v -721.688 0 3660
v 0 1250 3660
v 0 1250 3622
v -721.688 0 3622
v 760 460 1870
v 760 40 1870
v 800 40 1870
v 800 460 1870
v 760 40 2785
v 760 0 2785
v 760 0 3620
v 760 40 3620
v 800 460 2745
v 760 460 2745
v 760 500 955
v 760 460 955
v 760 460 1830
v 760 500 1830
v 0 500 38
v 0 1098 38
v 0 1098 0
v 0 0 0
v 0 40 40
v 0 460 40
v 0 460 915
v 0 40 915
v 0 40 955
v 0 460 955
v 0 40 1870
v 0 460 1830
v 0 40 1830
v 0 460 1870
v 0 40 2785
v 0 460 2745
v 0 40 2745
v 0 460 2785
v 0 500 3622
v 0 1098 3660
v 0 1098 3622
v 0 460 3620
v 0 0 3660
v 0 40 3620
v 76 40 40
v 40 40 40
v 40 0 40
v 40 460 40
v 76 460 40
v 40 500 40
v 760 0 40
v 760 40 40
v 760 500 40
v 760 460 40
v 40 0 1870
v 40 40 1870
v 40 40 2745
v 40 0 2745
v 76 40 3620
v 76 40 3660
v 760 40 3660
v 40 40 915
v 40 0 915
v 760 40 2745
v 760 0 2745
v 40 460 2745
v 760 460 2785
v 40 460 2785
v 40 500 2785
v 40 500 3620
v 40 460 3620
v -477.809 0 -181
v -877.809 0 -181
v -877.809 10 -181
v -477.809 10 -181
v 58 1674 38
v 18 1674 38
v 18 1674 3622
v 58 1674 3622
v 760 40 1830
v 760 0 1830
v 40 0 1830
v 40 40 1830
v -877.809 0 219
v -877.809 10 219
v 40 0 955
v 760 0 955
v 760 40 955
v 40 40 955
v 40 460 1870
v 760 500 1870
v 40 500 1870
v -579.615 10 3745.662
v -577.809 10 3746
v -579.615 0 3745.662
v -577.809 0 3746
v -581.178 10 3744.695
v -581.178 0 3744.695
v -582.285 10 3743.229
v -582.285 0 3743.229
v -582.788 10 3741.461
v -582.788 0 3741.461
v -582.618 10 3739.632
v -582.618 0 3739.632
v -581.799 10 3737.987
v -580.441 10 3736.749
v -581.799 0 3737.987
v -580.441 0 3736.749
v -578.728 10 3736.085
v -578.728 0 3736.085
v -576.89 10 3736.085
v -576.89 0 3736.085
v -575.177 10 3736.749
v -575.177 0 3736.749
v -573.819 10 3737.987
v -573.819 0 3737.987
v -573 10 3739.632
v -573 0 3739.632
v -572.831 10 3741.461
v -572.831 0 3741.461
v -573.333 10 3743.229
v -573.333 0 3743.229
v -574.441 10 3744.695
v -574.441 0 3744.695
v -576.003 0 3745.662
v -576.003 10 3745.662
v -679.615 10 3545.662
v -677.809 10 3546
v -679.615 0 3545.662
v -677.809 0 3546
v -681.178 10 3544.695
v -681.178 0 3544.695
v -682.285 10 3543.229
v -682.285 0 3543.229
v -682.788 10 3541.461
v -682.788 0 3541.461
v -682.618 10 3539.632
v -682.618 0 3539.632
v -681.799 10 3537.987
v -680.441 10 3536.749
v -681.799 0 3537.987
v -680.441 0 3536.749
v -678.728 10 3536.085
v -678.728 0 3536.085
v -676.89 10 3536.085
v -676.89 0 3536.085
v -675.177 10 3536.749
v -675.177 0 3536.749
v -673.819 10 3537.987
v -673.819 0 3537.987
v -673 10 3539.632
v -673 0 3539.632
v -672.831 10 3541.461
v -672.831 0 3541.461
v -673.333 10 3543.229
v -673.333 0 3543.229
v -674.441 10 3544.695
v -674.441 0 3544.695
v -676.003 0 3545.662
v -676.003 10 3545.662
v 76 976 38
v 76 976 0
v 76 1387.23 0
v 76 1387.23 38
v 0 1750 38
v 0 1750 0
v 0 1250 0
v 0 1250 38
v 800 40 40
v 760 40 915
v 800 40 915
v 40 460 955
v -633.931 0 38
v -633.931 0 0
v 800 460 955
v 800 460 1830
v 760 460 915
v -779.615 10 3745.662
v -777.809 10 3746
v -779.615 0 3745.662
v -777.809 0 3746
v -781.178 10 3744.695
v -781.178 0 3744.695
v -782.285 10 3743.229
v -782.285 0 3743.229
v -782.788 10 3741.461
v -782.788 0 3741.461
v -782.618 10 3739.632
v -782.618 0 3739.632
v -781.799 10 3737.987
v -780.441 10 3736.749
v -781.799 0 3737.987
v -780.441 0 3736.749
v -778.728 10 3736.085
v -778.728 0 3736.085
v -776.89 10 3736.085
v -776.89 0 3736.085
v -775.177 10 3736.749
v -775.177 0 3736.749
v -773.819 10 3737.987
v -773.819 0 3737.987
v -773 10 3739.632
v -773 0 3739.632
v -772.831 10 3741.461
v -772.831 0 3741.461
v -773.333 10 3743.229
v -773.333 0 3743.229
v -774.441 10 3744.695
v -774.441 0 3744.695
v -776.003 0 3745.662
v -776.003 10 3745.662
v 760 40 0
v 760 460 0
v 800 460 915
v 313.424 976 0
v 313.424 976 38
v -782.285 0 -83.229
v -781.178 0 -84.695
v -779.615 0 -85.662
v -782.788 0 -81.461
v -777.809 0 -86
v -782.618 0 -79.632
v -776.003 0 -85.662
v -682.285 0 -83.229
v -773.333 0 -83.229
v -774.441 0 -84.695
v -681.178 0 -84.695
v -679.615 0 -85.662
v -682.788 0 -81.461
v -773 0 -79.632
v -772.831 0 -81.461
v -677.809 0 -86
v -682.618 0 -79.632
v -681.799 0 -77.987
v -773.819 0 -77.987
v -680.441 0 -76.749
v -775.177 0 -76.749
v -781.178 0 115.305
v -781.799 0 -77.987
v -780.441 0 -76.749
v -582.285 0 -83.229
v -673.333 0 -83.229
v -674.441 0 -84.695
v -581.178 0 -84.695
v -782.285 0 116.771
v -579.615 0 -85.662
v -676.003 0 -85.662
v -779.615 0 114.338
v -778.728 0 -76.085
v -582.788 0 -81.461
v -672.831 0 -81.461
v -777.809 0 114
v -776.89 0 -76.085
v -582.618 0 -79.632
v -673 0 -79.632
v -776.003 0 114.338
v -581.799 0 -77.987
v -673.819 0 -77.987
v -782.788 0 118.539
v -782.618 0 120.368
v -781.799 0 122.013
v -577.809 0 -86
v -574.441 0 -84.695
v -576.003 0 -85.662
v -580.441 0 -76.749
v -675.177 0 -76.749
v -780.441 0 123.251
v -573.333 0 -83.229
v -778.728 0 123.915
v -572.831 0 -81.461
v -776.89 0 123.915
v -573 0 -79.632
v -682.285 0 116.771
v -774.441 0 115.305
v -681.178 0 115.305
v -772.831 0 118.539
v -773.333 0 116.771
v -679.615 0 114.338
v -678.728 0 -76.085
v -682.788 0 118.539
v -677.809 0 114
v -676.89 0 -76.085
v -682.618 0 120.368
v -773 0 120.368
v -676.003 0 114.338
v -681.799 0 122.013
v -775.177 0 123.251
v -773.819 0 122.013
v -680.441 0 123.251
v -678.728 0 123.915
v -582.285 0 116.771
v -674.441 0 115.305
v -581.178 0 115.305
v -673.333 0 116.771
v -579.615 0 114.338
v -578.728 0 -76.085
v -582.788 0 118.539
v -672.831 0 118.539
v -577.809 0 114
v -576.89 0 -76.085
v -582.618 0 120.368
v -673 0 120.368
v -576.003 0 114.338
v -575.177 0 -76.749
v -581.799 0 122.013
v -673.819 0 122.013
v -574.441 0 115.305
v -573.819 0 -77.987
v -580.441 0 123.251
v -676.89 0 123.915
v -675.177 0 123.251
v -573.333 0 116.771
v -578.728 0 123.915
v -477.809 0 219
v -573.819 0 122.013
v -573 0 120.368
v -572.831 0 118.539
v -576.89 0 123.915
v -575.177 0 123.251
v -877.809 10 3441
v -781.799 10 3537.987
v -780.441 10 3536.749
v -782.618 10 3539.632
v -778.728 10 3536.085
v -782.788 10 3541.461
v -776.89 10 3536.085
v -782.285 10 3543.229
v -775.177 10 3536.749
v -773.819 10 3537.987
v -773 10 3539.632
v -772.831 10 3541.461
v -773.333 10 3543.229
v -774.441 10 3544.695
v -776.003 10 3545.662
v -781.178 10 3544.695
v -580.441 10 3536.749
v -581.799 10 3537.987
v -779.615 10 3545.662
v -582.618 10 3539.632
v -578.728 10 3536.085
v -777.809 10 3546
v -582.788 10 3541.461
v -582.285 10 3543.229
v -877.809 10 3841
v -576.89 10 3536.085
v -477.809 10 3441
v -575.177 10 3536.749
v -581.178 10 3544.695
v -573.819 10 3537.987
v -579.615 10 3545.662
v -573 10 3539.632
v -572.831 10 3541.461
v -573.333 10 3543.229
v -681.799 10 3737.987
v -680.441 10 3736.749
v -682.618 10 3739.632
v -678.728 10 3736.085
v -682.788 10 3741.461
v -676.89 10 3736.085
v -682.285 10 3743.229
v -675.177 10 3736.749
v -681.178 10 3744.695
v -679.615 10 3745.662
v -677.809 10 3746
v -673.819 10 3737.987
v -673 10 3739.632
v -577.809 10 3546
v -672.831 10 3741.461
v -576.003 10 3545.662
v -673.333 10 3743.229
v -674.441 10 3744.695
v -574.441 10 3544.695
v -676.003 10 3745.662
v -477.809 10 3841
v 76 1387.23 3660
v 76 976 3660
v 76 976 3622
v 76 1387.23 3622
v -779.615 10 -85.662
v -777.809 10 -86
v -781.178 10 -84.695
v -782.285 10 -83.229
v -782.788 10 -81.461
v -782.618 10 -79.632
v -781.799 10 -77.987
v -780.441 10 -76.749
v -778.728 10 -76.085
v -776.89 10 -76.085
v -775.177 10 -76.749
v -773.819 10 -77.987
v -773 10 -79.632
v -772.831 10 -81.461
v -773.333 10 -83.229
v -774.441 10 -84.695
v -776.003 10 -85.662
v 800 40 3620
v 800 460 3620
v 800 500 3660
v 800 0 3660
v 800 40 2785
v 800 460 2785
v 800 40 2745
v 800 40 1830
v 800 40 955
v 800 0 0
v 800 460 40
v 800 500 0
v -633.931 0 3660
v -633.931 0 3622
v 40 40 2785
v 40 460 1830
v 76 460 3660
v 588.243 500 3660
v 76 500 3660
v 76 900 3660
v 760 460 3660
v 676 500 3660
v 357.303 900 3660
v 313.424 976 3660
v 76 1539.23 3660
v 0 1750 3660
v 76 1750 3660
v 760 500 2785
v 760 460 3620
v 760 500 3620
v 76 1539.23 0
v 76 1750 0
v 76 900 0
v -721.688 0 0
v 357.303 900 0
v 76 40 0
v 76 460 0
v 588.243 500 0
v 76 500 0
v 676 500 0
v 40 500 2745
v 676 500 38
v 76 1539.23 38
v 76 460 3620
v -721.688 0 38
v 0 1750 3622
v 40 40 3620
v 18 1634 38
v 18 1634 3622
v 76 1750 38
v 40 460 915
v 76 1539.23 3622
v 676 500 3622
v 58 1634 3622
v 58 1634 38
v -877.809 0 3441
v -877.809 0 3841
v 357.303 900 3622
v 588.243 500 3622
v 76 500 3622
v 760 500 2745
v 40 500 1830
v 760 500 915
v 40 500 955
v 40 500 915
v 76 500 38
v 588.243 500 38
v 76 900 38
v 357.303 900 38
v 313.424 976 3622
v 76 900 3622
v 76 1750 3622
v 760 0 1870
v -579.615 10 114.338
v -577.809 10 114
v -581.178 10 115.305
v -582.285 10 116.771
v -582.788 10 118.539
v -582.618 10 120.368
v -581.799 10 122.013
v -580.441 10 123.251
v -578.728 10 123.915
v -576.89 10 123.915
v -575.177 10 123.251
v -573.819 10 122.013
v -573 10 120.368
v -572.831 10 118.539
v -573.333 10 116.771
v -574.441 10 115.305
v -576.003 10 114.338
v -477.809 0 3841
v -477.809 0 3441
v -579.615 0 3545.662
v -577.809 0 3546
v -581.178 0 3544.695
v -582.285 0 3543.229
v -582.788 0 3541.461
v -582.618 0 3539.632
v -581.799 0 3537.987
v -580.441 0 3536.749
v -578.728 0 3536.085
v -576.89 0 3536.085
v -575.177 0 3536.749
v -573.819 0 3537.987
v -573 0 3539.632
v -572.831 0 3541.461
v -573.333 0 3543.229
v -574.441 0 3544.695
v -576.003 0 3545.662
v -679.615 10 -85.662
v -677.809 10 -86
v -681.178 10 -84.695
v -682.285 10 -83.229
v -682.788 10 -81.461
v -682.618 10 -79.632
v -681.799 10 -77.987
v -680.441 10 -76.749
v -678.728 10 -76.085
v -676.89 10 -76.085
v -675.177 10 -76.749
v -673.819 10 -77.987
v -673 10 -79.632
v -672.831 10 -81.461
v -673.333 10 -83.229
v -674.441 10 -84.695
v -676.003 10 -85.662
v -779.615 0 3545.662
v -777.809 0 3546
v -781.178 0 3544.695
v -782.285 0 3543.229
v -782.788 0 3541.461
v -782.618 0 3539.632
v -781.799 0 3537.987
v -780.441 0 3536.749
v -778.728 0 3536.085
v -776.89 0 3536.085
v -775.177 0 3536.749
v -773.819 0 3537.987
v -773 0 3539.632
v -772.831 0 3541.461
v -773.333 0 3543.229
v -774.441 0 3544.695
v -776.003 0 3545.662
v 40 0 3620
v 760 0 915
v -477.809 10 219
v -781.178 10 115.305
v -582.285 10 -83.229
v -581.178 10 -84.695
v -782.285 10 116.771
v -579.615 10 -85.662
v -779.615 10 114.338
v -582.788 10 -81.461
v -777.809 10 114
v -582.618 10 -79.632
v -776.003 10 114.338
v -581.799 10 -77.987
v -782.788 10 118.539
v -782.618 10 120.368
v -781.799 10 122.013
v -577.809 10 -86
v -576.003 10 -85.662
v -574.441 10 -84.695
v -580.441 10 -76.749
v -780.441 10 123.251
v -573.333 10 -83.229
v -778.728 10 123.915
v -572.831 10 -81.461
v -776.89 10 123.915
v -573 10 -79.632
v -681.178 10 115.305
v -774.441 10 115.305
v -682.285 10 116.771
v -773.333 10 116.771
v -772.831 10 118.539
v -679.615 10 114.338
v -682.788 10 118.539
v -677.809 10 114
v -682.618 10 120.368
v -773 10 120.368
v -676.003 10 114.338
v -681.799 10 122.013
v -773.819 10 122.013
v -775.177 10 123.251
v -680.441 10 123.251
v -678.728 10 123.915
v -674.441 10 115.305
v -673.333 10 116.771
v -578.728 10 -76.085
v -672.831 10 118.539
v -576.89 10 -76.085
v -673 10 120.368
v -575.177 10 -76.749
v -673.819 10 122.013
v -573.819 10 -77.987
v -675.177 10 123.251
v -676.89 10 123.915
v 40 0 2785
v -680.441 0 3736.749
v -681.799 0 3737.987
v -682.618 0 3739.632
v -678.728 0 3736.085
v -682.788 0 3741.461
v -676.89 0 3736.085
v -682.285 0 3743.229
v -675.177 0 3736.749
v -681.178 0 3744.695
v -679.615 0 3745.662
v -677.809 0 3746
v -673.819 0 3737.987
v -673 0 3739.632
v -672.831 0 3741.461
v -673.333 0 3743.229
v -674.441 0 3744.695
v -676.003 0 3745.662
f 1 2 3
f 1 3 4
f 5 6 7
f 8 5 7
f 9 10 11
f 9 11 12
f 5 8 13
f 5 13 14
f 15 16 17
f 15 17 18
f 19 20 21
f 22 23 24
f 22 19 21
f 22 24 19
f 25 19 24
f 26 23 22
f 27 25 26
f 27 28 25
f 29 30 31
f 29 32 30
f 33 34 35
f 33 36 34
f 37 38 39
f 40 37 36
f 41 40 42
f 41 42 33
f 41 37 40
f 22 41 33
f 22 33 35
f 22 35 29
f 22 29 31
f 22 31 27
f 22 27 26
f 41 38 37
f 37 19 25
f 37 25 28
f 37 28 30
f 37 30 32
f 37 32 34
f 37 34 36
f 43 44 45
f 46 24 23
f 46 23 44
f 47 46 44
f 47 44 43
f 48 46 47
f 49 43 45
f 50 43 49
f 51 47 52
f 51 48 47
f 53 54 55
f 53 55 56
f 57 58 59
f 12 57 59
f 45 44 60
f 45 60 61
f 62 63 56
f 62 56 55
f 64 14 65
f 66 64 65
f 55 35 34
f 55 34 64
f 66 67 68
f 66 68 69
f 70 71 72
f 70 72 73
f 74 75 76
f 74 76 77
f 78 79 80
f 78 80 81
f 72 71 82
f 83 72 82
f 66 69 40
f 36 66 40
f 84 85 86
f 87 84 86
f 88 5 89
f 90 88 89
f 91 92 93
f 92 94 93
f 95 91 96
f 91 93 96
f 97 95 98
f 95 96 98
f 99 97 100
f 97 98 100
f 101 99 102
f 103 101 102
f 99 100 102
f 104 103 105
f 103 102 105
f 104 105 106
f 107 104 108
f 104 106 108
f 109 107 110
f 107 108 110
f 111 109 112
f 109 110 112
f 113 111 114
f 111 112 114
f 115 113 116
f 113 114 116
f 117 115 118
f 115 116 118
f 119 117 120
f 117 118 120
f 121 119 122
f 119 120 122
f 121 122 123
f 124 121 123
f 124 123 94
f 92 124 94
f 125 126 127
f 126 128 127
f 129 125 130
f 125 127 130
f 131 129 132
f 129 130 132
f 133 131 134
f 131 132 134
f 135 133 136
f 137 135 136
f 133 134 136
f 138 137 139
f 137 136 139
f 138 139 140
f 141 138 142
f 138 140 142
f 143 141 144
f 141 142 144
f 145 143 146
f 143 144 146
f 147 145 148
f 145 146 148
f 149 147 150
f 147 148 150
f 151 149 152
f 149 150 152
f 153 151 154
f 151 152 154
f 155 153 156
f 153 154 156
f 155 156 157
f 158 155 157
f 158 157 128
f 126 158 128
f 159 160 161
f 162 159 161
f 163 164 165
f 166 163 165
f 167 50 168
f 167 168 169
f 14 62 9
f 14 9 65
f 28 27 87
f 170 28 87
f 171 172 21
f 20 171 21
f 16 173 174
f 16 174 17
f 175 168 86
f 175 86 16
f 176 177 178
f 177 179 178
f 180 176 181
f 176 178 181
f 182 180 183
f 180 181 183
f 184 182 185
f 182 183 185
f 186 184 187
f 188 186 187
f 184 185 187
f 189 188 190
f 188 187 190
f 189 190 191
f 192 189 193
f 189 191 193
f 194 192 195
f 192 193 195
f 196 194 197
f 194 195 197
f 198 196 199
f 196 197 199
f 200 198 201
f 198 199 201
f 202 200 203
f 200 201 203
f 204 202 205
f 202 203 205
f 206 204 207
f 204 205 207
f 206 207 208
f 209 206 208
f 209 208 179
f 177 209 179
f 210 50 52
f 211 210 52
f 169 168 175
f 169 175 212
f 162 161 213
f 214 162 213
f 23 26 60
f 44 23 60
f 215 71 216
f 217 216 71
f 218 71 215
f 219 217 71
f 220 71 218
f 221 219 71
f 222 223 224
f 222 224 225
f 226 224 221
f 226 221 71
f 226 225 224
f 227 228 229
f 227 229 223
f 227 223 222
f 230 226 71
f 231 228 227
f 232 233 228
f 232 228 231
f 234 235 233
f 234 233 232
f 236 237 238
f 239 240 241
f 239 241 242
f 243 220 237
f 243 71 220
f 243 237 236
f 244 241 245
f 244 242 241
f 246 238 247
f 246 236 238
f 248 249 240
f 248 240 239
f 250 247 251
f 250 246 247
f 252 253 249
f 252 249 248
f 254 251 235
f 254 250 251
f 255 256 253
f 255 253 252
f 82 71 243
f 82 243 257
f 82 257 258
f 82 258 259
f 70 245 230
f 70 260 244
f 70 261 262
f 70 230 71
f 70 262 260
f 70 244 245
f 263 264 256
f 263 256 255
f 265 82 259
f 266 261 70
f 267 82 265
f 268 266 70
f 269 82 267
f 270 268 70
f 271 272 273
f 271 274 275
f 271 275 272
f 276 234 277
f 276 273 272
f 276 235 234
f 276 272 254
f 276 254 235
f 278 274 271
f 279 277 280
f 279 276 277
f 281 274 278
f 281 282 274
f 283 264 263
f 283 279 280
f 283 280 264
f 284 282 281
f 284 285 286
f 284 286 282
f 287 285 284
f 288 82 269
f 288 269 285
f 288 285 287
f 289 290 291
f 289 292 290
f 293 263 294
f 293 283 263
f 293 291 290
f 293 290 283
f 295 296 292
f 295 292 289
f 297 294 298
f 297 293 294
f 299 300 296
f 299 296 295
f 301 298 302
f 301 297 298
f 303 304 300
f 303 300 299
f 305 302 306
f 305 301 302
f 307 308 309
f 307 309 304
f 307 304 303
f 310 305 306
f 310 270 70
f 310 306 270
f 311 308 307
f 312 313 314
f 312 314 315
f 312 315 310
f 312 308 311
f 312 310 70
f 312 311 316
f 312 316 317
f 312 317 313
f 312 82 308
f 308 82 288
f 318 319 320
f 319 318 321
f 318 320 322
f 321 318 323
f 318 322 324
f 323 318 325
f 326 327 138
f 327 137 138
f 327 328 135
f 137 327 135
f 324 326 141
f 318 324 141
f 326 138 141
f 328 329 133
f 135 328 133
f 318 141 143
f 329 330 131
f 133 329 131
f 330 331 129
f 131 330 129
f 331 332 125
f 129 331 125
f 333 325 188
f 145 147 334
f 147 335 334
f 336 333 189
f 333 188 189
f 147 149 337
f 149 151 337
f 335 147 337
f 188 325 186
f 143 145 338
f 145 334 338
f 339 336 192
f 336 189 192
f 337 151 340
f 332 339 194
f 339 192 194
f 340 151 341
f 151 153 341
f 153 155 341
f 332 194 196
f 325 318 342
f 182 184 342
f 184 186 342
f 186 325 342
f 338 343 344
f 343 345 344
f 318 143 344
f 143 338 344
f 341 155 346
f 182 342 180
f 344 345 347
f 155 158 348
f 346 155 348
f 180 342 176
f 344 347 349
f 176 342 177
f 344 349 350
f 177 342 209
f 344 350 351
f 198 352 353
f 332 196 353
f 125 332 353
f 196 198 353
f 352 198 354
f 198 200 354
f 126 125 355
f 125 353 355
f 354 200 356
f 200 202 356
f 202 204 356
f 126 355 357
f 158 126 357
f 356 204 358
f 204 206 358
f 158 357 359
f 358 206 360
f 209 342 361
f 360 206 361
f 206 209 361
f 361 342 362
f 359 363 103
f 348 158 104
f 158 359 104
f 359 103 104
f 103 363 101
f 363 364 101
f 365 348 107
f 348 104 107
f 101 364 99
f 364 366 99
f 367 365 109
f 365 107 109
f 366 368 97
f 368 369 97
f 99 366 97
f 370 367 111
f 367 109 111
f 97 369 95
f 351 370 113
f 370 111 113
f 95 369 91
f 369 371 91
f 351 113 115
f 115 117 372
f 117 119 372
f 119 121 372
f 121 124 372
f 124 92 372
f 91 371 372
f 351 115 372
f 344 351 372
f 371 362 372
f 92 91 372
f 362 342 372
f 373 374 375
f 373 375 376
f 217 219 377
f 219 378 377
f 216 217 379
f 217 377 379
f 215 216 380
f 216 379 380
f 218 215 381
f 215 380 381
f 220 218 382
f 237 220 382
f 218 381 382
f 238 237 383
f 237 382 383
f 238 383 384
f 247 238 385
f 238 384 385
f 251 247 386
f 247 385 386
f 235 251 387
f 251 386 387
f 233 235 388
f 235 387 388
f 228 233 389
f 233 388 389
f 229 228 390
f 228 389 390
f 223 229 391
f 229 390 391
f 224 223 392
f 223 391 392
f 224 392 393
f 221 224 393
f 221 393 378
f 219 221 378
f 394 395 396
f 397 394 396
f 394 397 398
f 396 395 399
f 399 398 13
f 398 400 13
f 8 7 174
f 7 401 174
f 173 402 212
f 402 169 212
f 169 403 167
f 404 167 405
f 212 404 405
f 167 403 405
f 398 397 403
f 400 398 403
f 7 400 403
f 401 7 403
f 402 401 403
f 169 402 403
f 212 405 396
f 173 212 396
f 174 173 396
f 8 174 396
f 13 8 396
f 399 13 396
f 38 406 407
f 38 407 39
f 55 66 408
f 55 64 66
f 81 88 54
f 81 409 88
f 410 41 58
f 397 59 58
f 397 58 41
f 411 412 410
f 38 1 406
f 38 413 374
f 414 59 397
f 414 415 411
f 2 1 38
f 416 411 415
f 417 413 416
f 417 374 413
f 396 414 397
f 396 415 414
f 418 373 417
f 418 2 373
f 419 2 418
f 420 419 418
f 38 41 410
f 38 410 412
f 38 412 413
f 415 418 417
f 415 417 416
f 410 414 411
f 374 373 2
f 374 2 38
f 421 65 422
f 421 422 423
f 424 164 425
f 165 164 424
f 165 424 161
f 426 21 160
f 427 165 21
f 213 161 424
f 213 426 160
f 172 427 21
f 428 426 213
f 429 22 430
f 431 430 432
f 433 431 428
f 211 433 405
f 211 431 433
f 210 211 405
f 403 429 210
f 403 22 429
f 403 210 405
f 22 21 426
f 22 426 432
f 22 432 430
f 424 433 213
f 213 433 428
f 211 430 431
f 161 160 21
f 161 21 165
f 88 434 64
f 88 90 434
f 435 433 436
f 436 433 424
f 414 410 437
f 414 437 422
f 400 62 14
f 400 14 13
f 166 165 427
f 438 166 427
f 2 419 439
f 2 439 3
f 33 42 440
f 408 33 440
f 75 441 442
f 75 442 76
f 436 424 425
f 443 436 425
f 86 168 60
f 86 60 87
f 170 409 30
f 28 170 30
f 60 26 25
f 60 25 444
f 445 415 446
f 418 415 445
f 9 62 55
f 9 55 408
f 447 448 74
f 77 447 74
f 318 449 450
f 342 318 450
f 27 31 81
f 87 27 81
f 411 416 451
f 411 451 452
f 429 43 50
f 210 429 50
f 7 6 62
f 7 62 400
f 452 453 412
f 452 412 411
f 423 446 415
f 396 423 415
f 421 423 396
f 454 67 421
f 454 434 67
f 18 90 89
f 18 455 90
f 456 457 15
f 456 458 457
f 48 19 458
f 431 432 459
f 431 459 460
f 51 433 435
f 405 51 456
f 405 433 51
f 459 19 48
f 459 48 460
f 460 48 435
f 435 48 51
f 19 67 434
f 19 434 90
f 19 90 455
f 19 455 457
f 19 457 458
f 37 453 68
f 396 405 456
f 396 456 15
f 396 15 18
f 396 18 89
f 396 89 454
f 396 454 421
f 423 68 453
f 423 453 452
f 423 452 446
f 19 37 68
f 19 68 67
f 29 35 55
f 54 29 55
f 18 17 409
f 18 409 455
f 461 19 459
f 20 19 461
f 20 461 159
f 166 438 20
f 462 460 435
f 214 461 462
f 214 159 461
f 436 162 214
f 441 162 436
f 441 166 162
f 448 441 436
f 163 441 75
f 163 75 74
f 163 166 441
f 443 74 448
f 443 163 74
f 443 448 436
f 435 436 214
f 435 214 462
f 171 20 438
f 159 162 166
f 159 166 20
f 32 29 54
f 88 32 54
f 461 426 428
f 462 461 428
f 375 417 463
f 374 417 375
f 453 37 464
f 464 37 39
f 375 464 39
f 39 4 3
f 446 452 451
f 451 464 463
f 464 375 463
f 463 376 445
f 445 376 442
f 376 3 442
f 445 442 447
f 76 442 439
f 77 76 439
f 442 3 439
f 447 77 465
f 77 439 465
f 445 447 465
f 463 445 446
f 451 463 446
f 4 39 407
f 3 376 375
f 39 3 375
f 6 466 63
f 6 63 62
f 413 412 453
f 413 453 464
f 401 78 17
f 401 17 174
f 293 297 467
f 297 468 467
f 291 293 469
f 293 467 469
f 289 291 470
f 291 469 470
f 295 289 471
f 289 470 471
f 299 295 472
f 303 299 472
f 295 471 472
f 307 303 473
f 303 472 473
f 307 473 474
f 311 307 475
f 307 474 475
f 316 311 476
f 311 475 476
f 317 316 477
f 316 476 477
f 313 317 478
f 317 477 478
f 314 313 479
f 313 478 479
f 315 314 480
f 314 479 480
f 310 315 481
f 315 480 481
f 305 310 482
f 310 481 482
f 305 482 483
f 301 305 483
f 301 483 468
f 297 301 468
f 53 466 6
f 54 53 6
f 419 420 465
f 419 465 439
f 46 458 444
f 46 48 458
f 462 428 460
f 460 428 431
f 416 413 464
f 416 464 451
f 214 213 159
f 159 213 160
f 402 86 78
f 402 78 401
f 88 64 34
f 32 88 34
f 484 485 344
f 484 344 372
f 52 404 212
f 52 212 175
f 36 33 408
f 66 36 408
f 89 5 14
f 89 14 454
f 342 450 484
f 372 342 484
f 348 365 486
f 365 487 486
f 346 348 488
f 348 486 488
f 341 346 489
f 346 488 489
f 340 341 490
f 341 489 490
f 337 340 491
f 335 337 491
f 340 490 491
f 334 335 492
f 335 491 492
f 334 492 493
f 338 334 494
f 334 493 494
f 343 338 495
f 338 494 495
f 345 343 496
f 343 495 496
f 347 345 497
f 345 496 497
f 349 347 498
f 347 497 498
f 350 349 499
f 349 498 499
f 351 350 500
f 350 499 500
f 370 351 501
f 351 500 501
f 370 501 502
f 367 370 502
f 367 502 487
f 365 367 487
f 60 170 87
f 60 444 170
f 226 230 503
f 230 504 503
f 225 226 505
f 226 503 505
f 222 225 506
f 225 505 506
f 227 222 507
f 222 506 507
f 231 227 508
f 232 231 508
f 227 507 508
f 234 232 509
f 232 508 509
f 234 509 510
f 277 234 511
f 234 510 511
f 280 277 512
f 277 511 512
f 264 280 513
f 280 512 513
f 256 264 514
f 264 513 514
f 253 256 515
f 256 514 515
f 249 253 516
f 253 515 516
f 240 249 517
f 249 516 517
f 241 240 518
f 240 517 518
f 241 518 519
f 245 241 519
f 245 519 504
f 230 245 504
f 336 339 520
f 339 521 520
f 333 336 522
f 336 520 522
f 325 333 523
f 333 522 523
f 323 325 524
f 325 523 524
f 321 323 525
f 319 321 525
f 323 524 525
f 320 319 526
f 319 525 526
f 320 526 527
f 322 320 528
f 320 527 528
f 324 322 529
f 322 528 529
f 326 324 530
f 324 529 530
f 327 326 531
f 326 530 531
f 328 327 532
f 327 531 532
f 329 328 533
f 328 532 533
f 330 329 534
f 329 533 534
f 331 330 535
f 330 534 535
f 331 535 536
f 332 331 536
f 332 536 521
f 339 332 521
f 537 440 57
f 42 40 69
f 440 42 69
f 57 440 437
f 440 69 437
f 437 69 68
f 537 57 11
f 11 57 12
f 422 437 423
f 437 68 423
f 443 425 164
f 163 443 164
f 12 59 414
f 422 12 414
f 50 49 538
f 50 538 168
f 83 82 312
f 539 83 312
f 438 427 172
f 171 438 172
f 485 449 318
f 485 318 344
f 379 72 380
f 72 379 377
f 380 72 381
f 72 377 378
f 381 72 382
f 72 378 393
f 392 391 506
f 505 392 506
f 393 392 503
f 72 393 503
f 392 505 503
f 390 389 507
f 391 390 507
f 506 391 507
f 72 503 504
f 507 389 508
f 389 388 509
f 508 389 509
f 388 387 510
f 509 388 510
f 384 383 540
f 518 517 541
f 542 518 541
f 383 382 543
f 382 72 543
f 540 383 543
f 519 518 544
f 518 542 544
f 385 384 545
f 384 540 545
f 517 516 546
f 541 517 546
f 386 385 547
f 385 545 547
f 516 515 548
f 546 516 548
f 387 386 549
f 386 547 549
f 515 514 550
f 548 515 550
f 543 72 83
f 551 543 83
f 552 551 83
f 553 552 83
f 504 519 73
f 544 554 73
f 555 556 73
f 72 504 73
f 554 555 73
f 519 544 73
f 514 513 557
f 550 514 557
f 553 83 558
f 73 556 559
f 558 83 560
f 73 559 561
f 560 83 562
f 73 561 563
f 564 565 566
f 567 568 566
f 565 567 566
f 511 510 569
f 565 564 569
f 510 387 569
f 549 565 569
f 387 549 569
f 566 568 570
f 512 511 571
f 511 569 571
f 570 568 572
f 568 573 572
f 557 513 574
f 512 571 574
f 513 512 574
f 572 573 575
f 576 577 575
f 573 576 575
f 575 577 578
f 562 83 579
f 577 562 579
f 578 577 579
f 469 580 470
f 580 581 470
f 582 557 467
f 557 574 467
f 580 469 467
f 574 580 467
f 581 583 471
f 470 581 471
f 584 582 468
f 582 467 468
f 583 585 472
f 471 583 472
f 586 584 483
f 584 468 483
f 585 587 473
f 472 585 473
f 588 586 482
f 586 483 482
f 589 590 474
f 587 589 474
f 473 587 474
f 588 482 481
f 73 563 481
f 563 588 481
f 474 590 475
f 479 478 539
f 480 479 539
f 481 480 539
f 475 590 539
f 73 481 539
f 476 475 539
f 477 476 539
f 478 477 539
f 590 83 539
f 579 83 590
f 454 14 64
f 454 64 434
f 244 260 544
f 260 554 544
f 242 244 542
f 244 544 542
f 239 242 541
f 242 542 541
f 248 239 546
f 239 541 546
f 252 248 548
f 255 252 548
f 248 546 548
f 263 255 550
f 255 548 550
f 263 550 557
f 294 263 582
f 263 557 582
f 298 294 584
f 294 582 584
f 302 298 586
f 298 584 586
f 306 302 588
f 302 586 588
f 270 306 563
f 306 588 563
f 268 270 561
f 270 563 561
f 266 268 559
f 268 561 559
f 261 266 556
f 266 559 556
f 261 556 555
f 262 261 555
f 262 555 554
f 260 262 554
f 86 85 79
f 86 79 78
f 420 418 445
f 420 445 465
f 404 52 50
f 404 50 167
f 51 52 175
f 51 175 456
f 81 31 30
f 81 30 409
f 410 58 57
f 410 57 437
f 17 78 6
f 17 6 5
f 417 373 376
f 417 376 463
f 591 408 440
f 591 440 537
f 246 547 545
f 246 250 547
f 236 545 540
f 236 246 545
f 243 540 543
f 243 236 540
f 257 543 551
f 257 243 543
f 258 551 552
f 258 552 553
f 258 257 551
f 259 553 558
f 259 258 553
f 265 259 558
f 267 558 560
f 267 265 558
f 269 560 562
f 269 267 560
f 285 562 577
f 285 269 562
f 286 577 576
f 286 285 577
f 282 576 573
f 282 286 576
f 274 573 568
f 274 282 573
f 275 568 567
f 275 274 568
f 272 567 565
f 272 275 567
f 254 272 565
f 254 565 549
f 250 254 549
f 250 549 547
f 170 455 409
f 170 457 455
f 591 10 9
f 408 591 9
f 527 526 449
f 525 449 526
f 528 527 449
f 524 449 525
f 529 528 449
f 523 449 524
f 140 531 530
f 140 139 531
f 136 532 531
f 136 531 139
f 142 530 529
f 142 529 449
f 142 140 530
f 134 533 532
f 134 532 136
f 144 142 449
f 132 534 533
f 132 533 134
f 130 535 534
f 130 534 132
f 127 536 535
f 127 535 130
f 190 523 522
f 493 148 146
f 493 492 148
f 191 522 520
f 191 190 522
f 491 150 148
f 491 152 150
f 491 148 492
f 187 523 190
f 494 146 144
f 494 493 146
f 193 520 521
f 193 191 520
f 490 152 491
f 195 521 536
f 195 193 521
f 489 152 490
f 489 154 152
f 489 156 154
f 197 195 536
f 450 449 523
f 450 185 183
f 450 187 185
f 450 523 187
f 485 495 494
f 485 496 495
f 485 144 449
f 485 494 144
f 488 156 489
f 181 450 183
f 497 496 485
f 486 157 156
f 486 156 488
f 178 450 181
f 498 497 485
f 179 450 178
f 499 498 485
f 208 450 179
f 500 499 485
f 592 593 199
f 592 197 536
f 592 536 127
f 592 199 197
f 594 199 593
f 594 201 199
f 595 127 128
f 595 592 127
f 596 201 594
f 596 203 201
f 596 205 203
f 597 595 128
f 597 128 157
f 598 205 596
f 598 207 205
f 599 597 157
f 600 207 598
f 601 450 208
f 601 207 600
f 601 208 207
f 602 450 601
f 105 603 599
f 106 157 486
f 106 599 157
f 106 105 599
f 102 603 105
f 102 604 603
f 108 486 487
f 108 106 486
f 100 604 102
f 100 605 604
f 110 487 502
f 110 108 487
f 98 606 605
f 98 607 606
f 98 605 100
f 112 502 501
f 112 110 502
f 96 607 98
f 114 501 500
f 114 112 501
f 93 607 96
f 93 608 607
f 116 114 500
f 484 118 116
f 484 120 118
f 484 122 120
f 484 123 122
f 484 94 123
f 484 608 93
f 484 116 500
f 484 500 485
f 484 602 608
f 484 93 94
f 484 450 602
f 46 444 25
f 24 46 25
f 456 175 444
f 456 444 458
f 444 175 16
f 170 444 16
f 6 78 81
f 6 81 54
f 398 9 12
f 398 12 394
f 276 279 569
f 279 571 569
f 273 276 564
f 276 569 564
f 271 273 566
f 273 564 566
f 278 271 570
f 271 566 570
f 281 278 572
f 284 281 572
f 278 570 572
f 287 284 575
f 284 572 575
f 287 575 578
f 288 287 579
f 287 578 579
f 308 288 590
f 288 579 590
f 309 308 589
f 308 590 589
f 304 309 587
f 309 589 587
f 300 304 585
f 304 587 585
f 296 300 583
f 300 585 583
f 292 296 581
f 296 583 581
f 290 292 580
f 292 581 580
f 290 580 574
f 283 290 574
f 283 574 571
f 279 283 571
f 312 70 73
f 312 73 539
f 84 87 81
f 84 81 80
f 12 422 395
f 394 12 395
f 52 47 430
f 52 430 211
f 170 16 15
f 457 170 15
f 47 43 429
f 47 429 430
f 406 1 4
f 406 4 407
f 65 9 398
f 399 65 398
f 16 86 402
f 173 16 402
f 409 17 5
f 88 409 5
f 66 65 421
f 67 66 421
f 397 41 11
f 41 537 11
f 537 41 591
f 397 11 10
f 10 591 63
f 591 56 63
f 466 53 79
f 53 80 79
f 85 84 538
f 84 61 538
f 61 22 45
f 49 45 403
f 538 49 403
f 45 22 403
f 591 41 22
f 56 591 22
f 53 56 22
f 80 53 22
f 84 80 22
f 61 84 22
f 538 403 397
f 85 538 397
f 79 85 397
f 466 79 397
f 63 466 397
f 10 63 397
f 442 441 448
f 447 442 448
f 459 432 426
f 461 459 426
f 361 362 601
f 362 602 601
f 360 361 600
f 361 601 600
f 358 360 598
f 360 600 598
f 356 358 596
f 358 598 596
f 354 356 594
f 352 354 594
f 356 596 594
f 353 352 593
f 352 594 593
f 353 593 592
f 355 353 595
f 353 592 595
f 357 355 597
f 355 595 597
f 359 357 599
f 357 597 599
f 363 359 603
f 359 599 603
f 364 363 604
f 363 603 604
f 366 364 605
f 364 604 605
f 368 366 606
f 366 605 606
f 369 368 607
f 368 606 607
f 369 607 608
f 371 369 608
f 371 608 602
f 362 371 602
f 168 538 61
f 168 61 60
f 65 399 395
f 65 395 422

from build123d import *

# Parameters (mm, degrees)
SKETCH1_W               = 800
SKETCH1_H               = 500
BOSS_EXTRUDE5_DEPTH     = 3660
BOSS_EXTRUDE5_2_DEPTH   = 3660
BOSS_EXTRUDE2_DEPTH     = 38
SKETCH4_W               = 684
SKETCH4_H               = 420
CUT_EXTRUDE1_DEPTH      = 3661
CUT_EXTRUDE2_DEPTH      = 1790
CUT_EXTRUDE2_DEPTH_BACK = 1790
BOSS_EXTRUDE3_DEPTH     = 76
SKETCH9_W               = 400
SKETCH9_H               = 400
BOSS_EXTRUDE6_DEPTH     = 10
BOSS_EXTRUDE6_2_DEPTH   = 10
SKETCH11_W              = 40
SKETCH11_H              = 40
BOSS_EXTRUDE7_DEPTH     = 3584
SKETCH12_W              = 40
SKETCH12_H              = 40
BOSS_EXTRUDE8_DEPTH     = 420
LPATTERN1_COUNT         = 4
LPATTERN1_PITCH         = 915
LPATTERN1_COUNT_DIR2    = 2
LPATTERN1_PITCH_DIR2    = 760
SKETCH13_W              = 40
SKETCH13_H              = 40
BOSS_EXTRUDE9_DEPTH     = 760
LPATTERN2_COUNT         = 4
LPATTERN2_PITCH         = 915
LPATTERN2_COUNT_DIR2    = 2
LPATTERN2_PITCH_DIR2    = 460
SKETCH14_W              = 4140.847934345
SKETCH14_H              = 3535.849458551
CUT_EXTRUDE3_DEPTH      = 182
CUT_EXTRUDE3_DEPTH_BACK = 3842
SKETCH17_W              = 5
SKETCH17_H              = 10
LPATTERN3_COUNT         = 2
LPATTERN3_PITCH         = 200
LPATTERN3_COUNT_DIR2    = 3
LPATTERN3_PITCH_DIR2    = 100
MIRROR3_COPY_1_SKETCH_W = 5
MIRROR3_COPY_1_SKETCH_H = 10
MIRROR3_COPY_2_SKETCH_W = 5
MIRROR3_COPY_2_SKETCH_H = 10
MIRROR3_COPY_3_SKETCH_W = 5
MIRROR3_COPY_3_SKETCH_H = 10
MIRROR3_COPY_4_SKETCH_W = 5
MIRROR3_COPY_4_SKETCH_H = 10
MIRROR3_COPY_5_SKETCH_W = 5
MIRROR3_COPY_5_SKETCH_H = 10


with BuildPart() as part:
    # Sketch1 → Boss-Extrude5 (new body)
    with BuildSketch(Plane.XY):
        with Locations((400, 250)):
            Rectangle(SKETCH1_W, SKETCH1_H)
    extrude(amount=BOSS_EXTRUDE5_DEPTH)

    # Sketch3 → Boss-Extrude2 (add)
    with BuildSketch(Plane.XY):
        Polygon((0, 500), (76, 500), (76, 900), (357.302651407, 900), (588.242759083, 500), (676, 500), (76, 1539.230484541), (76, 1750), (0, 1750), (0, 1250), (-721.687836487, 0), (-633.93059557, 0), (0, 1098), align=None)
        Polygon((76, 1387.230484541), (313.424030949, 976), (76, 976), align=None, mode=Mode.SUBTRACT)
    boss_extrude2 = extrude(amount=BOSS_EXTRUDE2_DEPTH)

    # Mirror1: Boss-Extrude2 across plane
    add(boss_extrude2.mirror(Plane.XY.offset(1830)))

    # Sketch4 → Cut-Extrude1 (cut, through all)
    with BuildSketch(Plane.XY.offset(3660)):
        with Locations((418, 250)):
            Rectangle(SKETCH4_W, SKETCH4_H)
    extrude(amount=-CUT_EXTRUDE1_DEPTH, mode=Mode.SUBTRACT)

    # Sketch5 → Cut-Extrude2 (cut, two sides)
    with BuildSketch(Plane.XY.offset(1830)) as cut_extrude2_sk:
        Polygon((40, 500), (40, 460), (0, 460), (0, 40), (40, 40), (40, 0), (760, 0), (760, 40), (800, 40), (800, 460), (760, 460), (760, 500), align=None)
    extrude(amount=CUT_EXTRUDE2_DEPTH, mode=Mode.SUBTRACT)
    extrude(cut_extrude2_sk.sketch, amount=-CUT_EXTRUDE2_DEPTH_BACK, mode=Mode.SUBTRACT)

    # Sketch11 → Boss-Extrude7 (add)
    with BuildSketch(Plane.XY.offset(38)):
        with Locations((38, 1654)):
            Rectangle(SKETCH11_W, SKETCH11_H)
    extrude(amount=BOSS_EXTRUDE7_DEPTH)

    # Sketch12 → Boss-Extrude8 (add)
    with BuildSketch(Plane(origin=(0, 40, 0), x_dir=(1, 0, 0), z_dir=(0, 1, 0))):
        with Locations((20, -20)):
            Rectangle(SKETCH12_W, SKETCH12_H)
    boss_extrude8 = extrude(amount=BOSS_EXTRUDE8_DEPTH)

    # LPattern1: Boss-Extrude8 4 × 2
    with Locations(*[(j * LPATTERN1_PITCH_DIR2, 0, i * LPATTERN1_PITCH) for i in range(LPATTERN1_COUNT) for j in range(LPATTERN1_COUNT_DIR2) if (i, j) != (0, 0)]):
        add(boss_extrude8)

    # Sketch13 → Boss-Extrude9 (add)
    with BuildSketch(Plane.ZY.offset(-760)):
        with Locations((20, 480)):
            Rectangle(SKETCH13_W, SKETCH13_H)
    boss_extrude9 = extrude(amount=BOSS_EXTRUDE9_DEPTH)

    # LPattern2: Boss-Extrude9 4 × 2
    with Locations(*[(0, -j * LPATTERN2_PITCH_DIR2, i * LPATTERN2_PITCH) for i in range(LPATTERN2_COUNT) for j in range(LPATTERN2_COUNT_DIR2) if (i, j) != (0, 0)]):
        add(boss_extrude9)


with BuildPart() as body_2:
    # Sketch1 → Boss-Extrude5 2 (new body)
    with BuildSketch(Plane.XY):
        Polygon((2614.411542732, 3678.652977851), (2630, 3669.652977851), (800, 500), (784.411542732, 509), align=None)
    extrude(amount=BOSS_EXTRUDE5_2_DEPTH)


with BuildPart() as body_3:
    # Sketch7 → Boss-Extrude3 (new body)
    with BuildSketch(Plane(origin=(367.905191786, -212.410161514, 0), x_dir=(0, 0, 1), z_dir=(-0.866025404, 0.5, 0))):
        Polygon((1830, 833.012701892), (0, 833.012701892), (0, 4493.012701892), (1830, 4493.012701892), (1830, 4455.012701892), (38, 4455.012701892), (38, 871.012701892), (1830, 871.012701892), align=None)
    boss_extrude3 = extrude(amount=BOSS_EXTRUDE3_DEPTH)

    # Mirror2: Boss-Extrude3 across plane
    add(boss_extrude3.mirror(Plane.XY.offset(1830)))


with BuildPart() as body_4:
    # Sketch9 → Boss-Extrude6 (new body)
    with BuildSketch(Plane.XZ):
        with Locations((-677.809216029, 3641)):
            Rectangle(SKETCH9_W, SKETCH9_H)
    extrude(amount=-BOSS_EXTRUDE6_DEPTH)

    # Sketch17 → Ø10.0mm Dowel Hole1 (revolve, cut)
    with BuildSketch(Plane(origin=(-777.809216029, 10, 3541), x_dir=(0, 0, 1), z_dir=(1, 0, 0))):
        with Locations((2.5, 5)):
            Rectangle(SKETCH17_W, SKETCH17_H)
    f_10_0mm_dowel_hole1 = revolve(axis=Axis((-777.809216029, 16.35, 3541), (0, -1, 0)), mode=Mode.SUBTRACT)

    # LPattern3: 10.0mm Dowel Hole1 2 × 3
    with Locations(*[(j * LPATTERN3_PITCH_DIR2, 0, i * LPATTERN3_PITCH) for i in range(LPATTERN3_COUNT) for j in range(LPATTERN3_COUNT_DIR2) if (i, j) != (0, 0)]):
        add(f_10_0mm_dowel_hole1, mode=Mode.SUBTRACT)


with BuildPart() as body_5:
    # Sketch9 → Boss-Extrude6 2 (new body)
    with BuildSketch(Plane.XZ):
        with Locations((-677.809216029, 19)):
            Rectangle(SKETCH9_W, SKETCH9_H)
    extrude(amount=-BOSS_EXTRUDE6_2_DEPTH)

    # Mirror3: Ø10.0mm Dowel Hole1 across plane
    add(f_10_0mm_dowel_hole1.mirror(Plane.XY.offset(1830)), mode=Mode.SUBTRACT)

    # Mirror3 copy 1 sketch → Mirror3 copy 1 (revolve, cut)
    with BuildSketch(Plane(origin=(-677.809216029, 10, 119), x_dir=(0, 0, -1), z_dir=(1, 0, 0))):
        with Locations((2.5, -5)):
            Rectangle(MIRROR3_COPY_1_SKETCH_W, MIRROR3_COPY_1_SKETCH_H)
    revolve(axis=Axis((-677.809216029, 16.35, 119), (0, 1, 0)), mode=Mode.SUBTRACT)

    # Mirror3 copy 2 sketch → Mirror3 copy 2 (revolve, cut)
    with BuildSketch(Plane(origin=(-577.809216029, 10, 119), x_dir=(0, 0, -1), z_dir=(1, 0, 0))):
        with Locations((2.5, -5)):
            Rectangle(MIRROR3_COPY_2_SKETCH_W, MIRROR3_COPY_2_SKETCH_H)
    revolve(axis=Axis((-577.809216029, 16.35, 119), (0, 1, 0)), mode=Mode.SUBTRACT)

    # Mirror3 copy 3 sketch → Mirror3 copy 3 (revolve, cut)
    with BuildSketch(Plane(origin=(-777.809216029, 10, -81), x_dir=(0, 0, -1), z_dir=(1, 0, 0))):
        with Locations((2.5, -5)):
            Rectangle(MIRROR3_COPY_3_SKETCH_W, MIRROR3_COPY_3_SKETCH_H)
    revolve(axis=Axis((-777.809216029, 16.35, -81), (0, 1, 0)), mode=Mode.SUBTRACT)

    # Mirror3 copy 4 sketch → Mirror3 copy 4 (revolve, cut)
    with BuildSketch(Plane(origin=(-677.809216029, 10, -81), x_dir=(0, 0, -1), z_dir=(1, 0, 0))):
        with Locations((2.5, -5)):
            Rectangle(MIRROR3_COPY_4_SKETCH_W, MIRROR3_COPY_4_SKETCH_H)
    revolve(axis=Axis((-677.809216029, 16.35, -81), (0, 1, 0)), mode=Mode.SUBTRACT)

    # Mirror3 copy 5 sketch → Mirror3 copy 5 (revolve, cut)
    with BuildSketch(Plane(origin=(-577.809216029, 10, -81), x_dir=(0, 0, -1), z_dir=(1, 0, 0))):
        with Locations((2.5, -5)):
            Rectangle(MIRROR3_COPY_5_SKETCH_W, MIRROR3_COPY_5_SKETCH_H)
    revolve(axis=Axis((-577.809216029, 16.35, -81), (0, 1, 0)), mode=Mode.SUBTRACT)


with BuildPart() as cut_extrude3_tool:
    # Sketch14 → Cut-Extrude3 (new body, two sides)
    with BuildSketch(Plane.XY.offset(3660)) as cut_extrude3_sk:
        with Locations((2687.602754195, 2267.924729276)):
            Rectangle(SKETCH14_W, SKETCH14_H)
    extrude(amount=CUT_EXTRUDE3_DEPTH)
    extrude(cut_extrude3_sk.sketch, amount=-CUT_EXTRUDE3_DEPTH_BACK)


with BuildPart() as body_3_1:
    add(body_3.part)

    # Cut-Extrude3: cut by cut_extrude3_tool
    add(cut_extrude3_tool.part, mode=Mode.SUBTRACT)


with BuildPart() as body_2_1:
    add(body_2.part)

    # Cut-Extrude3: cut by cut_extrude3_tool
    add(cut_extrude3_tool.part, mode=Mode.SUBTRACT)


solid = Compound([part.part, body_4.part, body_5.part])
